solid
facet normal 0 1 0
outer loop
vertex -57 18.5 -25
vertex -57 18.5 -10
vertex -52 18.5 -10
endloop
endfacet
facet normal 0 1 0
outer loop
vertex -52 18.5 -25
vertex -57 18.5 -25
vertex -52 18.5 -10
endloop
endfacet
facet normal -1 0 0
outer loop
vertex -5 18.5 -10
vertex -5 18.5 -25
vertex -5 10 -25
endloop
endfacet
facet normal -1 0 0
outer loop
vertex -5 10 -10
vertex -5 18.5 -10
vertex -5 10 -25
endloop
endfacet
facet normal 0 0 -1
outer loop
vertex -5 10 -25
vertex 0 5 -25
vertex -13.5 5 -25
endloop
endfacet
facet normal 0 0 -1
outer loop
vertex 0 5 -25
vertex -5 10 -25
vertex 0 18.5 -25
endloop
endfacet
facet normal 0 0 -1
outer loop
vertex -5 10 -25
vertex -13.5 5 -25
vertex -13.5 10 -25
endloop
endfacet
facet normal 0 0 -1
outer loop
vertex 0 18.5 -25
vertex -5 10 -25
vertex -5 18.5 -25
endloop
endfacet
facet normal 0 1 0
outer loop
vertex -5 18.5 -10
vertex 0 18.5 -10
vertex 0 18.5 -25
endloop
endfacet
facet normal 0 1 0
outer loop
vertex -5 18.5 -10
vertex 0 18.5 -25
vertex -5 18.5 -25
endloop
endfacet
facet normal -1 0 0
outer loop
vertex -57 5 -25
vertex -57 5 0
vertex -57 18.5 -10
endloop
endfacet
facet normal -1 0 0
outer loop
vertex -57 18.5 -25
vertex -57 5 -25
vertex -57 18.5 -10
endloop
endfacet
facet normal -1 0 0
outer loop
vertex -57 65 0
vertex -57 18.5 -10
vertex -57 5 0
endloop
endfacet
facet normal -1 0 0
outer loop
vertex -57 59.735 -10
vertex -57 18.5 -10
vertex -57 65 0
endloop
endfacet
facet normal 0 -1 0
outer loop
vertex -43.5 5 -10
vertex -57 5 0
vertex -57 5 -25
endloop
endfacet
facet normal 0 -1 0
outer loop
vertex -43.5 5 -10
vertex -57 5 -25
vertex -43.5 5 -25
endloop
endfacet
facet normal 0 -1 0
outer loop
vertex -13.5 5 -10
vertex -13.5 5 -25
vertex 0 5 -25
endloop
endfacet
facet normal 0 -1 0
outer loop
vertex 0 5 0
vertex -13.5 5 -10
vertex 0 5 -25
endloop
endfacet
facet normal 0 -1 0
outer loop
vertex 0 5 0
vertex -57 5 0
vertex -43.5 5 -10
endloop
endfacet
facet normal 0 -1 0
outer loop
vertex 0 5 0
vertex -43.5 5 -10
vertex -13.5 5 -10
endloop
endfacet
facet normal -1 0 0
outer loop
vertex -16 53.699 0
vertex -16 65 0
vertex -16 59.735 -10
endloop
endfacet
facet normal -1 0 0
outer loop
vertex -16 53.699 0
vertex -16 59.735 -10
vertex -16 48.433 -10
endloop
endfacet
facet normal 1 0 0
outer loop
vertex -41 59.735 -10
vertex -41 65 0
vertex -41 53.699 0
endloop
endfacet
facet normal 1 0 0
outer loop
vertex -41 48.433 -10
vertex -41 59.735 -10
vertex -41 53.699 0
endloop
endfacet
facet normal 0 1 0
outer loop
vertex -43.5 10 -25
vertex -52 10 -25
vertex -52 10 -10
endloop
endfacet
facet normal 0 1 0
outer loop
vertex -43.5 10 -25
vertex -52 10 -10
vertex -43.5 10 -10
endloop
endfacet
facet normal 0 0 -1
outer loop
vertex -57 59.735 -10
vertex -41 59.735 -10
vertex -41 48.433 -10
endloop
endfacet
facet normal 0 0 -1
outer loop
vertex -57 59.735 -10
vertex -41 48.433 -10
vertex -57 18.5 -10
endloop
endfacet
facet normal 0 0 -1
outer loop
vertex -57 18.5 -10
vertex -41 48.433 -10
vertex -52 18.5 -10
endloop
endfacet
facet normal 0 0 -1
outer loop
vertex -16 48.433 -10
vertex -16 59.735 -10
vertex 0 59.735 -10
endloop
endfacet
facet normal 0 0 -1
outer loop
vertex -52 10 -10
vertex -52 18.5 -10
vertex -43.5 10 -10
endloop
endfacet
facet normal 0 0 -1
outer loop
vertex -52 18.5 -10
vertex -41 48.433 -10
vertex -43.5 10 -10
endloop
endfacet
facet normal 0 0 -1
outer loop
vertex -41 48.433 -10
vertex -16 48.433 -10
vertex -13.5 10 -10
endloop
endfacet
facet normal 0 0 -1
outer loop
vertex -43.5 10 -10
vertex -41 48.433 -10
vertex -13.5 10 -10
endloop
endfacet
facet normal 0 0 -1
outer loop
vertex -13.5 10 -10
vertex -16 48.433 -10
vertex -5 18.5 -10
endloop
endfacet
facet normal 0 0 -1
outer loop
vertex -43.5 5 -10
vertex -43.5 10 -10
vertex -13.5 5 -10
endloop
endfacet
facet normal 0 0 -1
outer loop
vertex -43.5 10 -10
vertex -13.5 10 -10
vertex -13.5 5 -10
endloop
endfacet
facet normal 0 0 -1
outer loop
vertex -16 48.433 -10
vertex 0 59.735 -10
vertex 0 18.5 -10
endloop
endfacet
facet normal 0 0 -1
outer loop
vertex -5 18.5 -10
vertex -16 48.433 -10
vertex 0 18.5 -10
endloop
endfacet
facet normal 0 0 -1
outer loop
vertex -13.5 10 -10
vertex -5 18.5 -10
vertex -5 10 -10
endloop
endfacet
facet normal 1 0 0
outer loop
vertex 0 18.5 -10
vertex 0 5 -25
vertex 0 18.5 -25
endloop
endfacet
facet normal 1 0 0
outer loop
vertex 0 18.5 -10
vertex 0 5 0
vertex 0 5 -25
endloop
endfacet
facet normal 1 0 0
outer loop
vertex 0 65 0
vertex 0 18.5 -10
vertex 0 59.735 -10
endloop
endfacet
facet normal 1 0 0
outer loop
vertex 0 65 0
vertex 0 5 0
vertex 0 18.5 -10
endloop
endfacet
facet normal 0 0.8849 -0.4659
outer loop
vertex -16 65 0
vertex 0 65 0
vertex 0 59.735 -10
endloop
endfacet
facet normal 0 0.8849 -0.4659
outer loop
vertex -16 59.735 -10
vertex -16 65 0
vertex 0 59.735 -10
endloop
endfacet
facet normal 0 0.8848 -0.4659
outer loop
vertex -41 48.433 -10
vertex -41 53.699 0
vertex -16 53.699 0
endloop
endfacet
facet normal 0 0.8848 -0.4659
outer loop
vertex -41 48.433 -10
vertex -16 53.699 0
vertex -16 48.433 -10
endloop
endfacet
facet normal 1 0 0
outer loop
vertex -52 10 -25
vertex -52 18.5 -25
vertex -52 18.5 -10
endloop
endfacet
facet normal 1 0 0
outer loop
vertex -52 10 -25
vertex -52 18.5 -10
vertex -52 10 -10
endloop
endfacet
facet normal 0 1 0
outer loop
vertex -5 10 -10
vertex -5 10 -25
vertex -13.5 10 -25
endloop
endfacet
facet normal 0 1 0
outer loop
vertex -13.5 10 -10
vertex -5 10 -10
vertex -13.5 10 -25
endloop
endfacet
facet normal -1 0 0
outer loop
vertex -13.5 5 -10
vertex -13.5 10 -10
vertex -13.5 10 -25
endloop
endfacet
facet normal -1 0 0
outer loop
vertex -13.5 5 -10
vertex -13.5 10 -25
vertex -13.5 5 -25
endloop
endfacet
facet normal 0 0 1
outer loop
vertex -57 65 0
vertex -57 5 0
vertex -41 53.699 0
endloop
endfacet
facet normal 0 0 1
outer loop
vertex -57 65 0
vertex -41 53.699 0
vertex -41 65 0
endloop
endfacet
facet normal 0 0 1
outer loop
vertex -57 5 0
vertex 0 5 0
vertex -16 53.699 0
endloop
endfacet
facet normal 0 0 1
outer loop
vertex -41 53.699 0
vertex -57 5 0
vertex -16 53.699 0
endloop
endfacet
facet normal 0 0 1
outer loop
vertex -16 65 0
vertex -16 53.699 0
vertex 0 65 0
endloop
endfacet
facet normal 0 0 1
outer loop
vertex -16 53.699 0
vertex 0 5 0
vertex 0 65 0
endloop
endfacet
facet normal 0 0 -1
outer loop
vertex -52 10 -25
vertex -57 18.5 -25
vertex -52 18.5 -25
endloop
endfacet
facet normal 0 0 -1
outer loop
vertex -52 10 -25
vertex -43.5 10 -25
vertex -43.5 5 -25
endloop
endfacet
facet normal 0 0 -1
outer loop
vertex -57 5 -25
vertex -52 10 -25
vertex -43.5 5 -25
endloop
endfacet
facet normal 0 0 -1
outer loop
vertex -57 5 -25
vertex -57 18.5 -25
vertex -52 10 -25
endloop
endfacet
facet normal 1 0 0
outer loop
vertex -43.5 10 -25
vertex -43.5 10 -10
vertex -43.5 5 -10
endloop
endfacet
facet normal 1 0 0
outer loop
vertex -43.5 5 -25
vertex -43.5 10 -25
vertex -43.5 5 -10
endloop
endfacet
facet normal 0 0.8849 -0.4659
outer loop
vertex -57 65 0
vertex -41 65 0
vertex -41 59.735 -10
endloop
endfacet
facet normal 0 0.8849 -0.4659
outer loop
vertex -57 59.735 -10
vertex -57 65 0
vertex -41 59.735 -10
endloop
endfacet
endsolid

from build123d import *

# Parameters (mm, degrees)
PAD043_DEPTH        = 12.5
PAD044_DEPTH        = 57
PAD046_DEPTH        = 15
CUT_PLACEMENT_ANGLE = 180


with BuildPart() as body024:
    # Sketch100 → Pad043 (new body, symmetric)
    with BuildSketch(Plane.YZ):
        Polygon((43.43318, 10), (54.734671, 10), (60, 0), (48.698509, 0), align=None)
    extrude(amount=PAD043_DEPTH, both=True)


with BuildPart() as body024_1:
    # Body024 placement: moved
    add(body024.part.moved(Location((28.5, 0, 0))))


with BuildPart() as cut:
    # Sketch099 → Pad044 (new body)
    with BuildSketch(Plane.YZ):
        Polygon((0, 0), (60, 0), (54.734671, 10), (0, 10), align=None)
    extrude(amount=PAD044_DEPTH)

    # Sketch103 (on Face1 of Pad044) → Pad046 (join)
    with BuildSketch(Plane(origin=(0, 0, 10), x_dir=(0, -1, 0), z_dir=(0, 0, 1))):
        Polygon((0, 0), (-13.5, 0), (-13.5, 5), (-5, 5), (-5, 13.5), (0, 13.5), align=None)
        Polygon((0, 57), (-13.5, 57), (-13.5, 52), (-5, 52), (-5, 43.5), (0, 43.5), align=None)
    extrude(amount=PAD046_DEPTH)

    # Cut: cut Body024
    add(body024_1.part, mode=Mode.SUBTRACT)


with BuildPart() as cut_1:
    # Cut placement: moved
    add(cut.part.moved(Location((0, 5, 0))).rotate(Axis((0, 5, 0), (0, 1, 0)), CUT_PLACEMENT_ANGLE))


solid = cut_1.part
